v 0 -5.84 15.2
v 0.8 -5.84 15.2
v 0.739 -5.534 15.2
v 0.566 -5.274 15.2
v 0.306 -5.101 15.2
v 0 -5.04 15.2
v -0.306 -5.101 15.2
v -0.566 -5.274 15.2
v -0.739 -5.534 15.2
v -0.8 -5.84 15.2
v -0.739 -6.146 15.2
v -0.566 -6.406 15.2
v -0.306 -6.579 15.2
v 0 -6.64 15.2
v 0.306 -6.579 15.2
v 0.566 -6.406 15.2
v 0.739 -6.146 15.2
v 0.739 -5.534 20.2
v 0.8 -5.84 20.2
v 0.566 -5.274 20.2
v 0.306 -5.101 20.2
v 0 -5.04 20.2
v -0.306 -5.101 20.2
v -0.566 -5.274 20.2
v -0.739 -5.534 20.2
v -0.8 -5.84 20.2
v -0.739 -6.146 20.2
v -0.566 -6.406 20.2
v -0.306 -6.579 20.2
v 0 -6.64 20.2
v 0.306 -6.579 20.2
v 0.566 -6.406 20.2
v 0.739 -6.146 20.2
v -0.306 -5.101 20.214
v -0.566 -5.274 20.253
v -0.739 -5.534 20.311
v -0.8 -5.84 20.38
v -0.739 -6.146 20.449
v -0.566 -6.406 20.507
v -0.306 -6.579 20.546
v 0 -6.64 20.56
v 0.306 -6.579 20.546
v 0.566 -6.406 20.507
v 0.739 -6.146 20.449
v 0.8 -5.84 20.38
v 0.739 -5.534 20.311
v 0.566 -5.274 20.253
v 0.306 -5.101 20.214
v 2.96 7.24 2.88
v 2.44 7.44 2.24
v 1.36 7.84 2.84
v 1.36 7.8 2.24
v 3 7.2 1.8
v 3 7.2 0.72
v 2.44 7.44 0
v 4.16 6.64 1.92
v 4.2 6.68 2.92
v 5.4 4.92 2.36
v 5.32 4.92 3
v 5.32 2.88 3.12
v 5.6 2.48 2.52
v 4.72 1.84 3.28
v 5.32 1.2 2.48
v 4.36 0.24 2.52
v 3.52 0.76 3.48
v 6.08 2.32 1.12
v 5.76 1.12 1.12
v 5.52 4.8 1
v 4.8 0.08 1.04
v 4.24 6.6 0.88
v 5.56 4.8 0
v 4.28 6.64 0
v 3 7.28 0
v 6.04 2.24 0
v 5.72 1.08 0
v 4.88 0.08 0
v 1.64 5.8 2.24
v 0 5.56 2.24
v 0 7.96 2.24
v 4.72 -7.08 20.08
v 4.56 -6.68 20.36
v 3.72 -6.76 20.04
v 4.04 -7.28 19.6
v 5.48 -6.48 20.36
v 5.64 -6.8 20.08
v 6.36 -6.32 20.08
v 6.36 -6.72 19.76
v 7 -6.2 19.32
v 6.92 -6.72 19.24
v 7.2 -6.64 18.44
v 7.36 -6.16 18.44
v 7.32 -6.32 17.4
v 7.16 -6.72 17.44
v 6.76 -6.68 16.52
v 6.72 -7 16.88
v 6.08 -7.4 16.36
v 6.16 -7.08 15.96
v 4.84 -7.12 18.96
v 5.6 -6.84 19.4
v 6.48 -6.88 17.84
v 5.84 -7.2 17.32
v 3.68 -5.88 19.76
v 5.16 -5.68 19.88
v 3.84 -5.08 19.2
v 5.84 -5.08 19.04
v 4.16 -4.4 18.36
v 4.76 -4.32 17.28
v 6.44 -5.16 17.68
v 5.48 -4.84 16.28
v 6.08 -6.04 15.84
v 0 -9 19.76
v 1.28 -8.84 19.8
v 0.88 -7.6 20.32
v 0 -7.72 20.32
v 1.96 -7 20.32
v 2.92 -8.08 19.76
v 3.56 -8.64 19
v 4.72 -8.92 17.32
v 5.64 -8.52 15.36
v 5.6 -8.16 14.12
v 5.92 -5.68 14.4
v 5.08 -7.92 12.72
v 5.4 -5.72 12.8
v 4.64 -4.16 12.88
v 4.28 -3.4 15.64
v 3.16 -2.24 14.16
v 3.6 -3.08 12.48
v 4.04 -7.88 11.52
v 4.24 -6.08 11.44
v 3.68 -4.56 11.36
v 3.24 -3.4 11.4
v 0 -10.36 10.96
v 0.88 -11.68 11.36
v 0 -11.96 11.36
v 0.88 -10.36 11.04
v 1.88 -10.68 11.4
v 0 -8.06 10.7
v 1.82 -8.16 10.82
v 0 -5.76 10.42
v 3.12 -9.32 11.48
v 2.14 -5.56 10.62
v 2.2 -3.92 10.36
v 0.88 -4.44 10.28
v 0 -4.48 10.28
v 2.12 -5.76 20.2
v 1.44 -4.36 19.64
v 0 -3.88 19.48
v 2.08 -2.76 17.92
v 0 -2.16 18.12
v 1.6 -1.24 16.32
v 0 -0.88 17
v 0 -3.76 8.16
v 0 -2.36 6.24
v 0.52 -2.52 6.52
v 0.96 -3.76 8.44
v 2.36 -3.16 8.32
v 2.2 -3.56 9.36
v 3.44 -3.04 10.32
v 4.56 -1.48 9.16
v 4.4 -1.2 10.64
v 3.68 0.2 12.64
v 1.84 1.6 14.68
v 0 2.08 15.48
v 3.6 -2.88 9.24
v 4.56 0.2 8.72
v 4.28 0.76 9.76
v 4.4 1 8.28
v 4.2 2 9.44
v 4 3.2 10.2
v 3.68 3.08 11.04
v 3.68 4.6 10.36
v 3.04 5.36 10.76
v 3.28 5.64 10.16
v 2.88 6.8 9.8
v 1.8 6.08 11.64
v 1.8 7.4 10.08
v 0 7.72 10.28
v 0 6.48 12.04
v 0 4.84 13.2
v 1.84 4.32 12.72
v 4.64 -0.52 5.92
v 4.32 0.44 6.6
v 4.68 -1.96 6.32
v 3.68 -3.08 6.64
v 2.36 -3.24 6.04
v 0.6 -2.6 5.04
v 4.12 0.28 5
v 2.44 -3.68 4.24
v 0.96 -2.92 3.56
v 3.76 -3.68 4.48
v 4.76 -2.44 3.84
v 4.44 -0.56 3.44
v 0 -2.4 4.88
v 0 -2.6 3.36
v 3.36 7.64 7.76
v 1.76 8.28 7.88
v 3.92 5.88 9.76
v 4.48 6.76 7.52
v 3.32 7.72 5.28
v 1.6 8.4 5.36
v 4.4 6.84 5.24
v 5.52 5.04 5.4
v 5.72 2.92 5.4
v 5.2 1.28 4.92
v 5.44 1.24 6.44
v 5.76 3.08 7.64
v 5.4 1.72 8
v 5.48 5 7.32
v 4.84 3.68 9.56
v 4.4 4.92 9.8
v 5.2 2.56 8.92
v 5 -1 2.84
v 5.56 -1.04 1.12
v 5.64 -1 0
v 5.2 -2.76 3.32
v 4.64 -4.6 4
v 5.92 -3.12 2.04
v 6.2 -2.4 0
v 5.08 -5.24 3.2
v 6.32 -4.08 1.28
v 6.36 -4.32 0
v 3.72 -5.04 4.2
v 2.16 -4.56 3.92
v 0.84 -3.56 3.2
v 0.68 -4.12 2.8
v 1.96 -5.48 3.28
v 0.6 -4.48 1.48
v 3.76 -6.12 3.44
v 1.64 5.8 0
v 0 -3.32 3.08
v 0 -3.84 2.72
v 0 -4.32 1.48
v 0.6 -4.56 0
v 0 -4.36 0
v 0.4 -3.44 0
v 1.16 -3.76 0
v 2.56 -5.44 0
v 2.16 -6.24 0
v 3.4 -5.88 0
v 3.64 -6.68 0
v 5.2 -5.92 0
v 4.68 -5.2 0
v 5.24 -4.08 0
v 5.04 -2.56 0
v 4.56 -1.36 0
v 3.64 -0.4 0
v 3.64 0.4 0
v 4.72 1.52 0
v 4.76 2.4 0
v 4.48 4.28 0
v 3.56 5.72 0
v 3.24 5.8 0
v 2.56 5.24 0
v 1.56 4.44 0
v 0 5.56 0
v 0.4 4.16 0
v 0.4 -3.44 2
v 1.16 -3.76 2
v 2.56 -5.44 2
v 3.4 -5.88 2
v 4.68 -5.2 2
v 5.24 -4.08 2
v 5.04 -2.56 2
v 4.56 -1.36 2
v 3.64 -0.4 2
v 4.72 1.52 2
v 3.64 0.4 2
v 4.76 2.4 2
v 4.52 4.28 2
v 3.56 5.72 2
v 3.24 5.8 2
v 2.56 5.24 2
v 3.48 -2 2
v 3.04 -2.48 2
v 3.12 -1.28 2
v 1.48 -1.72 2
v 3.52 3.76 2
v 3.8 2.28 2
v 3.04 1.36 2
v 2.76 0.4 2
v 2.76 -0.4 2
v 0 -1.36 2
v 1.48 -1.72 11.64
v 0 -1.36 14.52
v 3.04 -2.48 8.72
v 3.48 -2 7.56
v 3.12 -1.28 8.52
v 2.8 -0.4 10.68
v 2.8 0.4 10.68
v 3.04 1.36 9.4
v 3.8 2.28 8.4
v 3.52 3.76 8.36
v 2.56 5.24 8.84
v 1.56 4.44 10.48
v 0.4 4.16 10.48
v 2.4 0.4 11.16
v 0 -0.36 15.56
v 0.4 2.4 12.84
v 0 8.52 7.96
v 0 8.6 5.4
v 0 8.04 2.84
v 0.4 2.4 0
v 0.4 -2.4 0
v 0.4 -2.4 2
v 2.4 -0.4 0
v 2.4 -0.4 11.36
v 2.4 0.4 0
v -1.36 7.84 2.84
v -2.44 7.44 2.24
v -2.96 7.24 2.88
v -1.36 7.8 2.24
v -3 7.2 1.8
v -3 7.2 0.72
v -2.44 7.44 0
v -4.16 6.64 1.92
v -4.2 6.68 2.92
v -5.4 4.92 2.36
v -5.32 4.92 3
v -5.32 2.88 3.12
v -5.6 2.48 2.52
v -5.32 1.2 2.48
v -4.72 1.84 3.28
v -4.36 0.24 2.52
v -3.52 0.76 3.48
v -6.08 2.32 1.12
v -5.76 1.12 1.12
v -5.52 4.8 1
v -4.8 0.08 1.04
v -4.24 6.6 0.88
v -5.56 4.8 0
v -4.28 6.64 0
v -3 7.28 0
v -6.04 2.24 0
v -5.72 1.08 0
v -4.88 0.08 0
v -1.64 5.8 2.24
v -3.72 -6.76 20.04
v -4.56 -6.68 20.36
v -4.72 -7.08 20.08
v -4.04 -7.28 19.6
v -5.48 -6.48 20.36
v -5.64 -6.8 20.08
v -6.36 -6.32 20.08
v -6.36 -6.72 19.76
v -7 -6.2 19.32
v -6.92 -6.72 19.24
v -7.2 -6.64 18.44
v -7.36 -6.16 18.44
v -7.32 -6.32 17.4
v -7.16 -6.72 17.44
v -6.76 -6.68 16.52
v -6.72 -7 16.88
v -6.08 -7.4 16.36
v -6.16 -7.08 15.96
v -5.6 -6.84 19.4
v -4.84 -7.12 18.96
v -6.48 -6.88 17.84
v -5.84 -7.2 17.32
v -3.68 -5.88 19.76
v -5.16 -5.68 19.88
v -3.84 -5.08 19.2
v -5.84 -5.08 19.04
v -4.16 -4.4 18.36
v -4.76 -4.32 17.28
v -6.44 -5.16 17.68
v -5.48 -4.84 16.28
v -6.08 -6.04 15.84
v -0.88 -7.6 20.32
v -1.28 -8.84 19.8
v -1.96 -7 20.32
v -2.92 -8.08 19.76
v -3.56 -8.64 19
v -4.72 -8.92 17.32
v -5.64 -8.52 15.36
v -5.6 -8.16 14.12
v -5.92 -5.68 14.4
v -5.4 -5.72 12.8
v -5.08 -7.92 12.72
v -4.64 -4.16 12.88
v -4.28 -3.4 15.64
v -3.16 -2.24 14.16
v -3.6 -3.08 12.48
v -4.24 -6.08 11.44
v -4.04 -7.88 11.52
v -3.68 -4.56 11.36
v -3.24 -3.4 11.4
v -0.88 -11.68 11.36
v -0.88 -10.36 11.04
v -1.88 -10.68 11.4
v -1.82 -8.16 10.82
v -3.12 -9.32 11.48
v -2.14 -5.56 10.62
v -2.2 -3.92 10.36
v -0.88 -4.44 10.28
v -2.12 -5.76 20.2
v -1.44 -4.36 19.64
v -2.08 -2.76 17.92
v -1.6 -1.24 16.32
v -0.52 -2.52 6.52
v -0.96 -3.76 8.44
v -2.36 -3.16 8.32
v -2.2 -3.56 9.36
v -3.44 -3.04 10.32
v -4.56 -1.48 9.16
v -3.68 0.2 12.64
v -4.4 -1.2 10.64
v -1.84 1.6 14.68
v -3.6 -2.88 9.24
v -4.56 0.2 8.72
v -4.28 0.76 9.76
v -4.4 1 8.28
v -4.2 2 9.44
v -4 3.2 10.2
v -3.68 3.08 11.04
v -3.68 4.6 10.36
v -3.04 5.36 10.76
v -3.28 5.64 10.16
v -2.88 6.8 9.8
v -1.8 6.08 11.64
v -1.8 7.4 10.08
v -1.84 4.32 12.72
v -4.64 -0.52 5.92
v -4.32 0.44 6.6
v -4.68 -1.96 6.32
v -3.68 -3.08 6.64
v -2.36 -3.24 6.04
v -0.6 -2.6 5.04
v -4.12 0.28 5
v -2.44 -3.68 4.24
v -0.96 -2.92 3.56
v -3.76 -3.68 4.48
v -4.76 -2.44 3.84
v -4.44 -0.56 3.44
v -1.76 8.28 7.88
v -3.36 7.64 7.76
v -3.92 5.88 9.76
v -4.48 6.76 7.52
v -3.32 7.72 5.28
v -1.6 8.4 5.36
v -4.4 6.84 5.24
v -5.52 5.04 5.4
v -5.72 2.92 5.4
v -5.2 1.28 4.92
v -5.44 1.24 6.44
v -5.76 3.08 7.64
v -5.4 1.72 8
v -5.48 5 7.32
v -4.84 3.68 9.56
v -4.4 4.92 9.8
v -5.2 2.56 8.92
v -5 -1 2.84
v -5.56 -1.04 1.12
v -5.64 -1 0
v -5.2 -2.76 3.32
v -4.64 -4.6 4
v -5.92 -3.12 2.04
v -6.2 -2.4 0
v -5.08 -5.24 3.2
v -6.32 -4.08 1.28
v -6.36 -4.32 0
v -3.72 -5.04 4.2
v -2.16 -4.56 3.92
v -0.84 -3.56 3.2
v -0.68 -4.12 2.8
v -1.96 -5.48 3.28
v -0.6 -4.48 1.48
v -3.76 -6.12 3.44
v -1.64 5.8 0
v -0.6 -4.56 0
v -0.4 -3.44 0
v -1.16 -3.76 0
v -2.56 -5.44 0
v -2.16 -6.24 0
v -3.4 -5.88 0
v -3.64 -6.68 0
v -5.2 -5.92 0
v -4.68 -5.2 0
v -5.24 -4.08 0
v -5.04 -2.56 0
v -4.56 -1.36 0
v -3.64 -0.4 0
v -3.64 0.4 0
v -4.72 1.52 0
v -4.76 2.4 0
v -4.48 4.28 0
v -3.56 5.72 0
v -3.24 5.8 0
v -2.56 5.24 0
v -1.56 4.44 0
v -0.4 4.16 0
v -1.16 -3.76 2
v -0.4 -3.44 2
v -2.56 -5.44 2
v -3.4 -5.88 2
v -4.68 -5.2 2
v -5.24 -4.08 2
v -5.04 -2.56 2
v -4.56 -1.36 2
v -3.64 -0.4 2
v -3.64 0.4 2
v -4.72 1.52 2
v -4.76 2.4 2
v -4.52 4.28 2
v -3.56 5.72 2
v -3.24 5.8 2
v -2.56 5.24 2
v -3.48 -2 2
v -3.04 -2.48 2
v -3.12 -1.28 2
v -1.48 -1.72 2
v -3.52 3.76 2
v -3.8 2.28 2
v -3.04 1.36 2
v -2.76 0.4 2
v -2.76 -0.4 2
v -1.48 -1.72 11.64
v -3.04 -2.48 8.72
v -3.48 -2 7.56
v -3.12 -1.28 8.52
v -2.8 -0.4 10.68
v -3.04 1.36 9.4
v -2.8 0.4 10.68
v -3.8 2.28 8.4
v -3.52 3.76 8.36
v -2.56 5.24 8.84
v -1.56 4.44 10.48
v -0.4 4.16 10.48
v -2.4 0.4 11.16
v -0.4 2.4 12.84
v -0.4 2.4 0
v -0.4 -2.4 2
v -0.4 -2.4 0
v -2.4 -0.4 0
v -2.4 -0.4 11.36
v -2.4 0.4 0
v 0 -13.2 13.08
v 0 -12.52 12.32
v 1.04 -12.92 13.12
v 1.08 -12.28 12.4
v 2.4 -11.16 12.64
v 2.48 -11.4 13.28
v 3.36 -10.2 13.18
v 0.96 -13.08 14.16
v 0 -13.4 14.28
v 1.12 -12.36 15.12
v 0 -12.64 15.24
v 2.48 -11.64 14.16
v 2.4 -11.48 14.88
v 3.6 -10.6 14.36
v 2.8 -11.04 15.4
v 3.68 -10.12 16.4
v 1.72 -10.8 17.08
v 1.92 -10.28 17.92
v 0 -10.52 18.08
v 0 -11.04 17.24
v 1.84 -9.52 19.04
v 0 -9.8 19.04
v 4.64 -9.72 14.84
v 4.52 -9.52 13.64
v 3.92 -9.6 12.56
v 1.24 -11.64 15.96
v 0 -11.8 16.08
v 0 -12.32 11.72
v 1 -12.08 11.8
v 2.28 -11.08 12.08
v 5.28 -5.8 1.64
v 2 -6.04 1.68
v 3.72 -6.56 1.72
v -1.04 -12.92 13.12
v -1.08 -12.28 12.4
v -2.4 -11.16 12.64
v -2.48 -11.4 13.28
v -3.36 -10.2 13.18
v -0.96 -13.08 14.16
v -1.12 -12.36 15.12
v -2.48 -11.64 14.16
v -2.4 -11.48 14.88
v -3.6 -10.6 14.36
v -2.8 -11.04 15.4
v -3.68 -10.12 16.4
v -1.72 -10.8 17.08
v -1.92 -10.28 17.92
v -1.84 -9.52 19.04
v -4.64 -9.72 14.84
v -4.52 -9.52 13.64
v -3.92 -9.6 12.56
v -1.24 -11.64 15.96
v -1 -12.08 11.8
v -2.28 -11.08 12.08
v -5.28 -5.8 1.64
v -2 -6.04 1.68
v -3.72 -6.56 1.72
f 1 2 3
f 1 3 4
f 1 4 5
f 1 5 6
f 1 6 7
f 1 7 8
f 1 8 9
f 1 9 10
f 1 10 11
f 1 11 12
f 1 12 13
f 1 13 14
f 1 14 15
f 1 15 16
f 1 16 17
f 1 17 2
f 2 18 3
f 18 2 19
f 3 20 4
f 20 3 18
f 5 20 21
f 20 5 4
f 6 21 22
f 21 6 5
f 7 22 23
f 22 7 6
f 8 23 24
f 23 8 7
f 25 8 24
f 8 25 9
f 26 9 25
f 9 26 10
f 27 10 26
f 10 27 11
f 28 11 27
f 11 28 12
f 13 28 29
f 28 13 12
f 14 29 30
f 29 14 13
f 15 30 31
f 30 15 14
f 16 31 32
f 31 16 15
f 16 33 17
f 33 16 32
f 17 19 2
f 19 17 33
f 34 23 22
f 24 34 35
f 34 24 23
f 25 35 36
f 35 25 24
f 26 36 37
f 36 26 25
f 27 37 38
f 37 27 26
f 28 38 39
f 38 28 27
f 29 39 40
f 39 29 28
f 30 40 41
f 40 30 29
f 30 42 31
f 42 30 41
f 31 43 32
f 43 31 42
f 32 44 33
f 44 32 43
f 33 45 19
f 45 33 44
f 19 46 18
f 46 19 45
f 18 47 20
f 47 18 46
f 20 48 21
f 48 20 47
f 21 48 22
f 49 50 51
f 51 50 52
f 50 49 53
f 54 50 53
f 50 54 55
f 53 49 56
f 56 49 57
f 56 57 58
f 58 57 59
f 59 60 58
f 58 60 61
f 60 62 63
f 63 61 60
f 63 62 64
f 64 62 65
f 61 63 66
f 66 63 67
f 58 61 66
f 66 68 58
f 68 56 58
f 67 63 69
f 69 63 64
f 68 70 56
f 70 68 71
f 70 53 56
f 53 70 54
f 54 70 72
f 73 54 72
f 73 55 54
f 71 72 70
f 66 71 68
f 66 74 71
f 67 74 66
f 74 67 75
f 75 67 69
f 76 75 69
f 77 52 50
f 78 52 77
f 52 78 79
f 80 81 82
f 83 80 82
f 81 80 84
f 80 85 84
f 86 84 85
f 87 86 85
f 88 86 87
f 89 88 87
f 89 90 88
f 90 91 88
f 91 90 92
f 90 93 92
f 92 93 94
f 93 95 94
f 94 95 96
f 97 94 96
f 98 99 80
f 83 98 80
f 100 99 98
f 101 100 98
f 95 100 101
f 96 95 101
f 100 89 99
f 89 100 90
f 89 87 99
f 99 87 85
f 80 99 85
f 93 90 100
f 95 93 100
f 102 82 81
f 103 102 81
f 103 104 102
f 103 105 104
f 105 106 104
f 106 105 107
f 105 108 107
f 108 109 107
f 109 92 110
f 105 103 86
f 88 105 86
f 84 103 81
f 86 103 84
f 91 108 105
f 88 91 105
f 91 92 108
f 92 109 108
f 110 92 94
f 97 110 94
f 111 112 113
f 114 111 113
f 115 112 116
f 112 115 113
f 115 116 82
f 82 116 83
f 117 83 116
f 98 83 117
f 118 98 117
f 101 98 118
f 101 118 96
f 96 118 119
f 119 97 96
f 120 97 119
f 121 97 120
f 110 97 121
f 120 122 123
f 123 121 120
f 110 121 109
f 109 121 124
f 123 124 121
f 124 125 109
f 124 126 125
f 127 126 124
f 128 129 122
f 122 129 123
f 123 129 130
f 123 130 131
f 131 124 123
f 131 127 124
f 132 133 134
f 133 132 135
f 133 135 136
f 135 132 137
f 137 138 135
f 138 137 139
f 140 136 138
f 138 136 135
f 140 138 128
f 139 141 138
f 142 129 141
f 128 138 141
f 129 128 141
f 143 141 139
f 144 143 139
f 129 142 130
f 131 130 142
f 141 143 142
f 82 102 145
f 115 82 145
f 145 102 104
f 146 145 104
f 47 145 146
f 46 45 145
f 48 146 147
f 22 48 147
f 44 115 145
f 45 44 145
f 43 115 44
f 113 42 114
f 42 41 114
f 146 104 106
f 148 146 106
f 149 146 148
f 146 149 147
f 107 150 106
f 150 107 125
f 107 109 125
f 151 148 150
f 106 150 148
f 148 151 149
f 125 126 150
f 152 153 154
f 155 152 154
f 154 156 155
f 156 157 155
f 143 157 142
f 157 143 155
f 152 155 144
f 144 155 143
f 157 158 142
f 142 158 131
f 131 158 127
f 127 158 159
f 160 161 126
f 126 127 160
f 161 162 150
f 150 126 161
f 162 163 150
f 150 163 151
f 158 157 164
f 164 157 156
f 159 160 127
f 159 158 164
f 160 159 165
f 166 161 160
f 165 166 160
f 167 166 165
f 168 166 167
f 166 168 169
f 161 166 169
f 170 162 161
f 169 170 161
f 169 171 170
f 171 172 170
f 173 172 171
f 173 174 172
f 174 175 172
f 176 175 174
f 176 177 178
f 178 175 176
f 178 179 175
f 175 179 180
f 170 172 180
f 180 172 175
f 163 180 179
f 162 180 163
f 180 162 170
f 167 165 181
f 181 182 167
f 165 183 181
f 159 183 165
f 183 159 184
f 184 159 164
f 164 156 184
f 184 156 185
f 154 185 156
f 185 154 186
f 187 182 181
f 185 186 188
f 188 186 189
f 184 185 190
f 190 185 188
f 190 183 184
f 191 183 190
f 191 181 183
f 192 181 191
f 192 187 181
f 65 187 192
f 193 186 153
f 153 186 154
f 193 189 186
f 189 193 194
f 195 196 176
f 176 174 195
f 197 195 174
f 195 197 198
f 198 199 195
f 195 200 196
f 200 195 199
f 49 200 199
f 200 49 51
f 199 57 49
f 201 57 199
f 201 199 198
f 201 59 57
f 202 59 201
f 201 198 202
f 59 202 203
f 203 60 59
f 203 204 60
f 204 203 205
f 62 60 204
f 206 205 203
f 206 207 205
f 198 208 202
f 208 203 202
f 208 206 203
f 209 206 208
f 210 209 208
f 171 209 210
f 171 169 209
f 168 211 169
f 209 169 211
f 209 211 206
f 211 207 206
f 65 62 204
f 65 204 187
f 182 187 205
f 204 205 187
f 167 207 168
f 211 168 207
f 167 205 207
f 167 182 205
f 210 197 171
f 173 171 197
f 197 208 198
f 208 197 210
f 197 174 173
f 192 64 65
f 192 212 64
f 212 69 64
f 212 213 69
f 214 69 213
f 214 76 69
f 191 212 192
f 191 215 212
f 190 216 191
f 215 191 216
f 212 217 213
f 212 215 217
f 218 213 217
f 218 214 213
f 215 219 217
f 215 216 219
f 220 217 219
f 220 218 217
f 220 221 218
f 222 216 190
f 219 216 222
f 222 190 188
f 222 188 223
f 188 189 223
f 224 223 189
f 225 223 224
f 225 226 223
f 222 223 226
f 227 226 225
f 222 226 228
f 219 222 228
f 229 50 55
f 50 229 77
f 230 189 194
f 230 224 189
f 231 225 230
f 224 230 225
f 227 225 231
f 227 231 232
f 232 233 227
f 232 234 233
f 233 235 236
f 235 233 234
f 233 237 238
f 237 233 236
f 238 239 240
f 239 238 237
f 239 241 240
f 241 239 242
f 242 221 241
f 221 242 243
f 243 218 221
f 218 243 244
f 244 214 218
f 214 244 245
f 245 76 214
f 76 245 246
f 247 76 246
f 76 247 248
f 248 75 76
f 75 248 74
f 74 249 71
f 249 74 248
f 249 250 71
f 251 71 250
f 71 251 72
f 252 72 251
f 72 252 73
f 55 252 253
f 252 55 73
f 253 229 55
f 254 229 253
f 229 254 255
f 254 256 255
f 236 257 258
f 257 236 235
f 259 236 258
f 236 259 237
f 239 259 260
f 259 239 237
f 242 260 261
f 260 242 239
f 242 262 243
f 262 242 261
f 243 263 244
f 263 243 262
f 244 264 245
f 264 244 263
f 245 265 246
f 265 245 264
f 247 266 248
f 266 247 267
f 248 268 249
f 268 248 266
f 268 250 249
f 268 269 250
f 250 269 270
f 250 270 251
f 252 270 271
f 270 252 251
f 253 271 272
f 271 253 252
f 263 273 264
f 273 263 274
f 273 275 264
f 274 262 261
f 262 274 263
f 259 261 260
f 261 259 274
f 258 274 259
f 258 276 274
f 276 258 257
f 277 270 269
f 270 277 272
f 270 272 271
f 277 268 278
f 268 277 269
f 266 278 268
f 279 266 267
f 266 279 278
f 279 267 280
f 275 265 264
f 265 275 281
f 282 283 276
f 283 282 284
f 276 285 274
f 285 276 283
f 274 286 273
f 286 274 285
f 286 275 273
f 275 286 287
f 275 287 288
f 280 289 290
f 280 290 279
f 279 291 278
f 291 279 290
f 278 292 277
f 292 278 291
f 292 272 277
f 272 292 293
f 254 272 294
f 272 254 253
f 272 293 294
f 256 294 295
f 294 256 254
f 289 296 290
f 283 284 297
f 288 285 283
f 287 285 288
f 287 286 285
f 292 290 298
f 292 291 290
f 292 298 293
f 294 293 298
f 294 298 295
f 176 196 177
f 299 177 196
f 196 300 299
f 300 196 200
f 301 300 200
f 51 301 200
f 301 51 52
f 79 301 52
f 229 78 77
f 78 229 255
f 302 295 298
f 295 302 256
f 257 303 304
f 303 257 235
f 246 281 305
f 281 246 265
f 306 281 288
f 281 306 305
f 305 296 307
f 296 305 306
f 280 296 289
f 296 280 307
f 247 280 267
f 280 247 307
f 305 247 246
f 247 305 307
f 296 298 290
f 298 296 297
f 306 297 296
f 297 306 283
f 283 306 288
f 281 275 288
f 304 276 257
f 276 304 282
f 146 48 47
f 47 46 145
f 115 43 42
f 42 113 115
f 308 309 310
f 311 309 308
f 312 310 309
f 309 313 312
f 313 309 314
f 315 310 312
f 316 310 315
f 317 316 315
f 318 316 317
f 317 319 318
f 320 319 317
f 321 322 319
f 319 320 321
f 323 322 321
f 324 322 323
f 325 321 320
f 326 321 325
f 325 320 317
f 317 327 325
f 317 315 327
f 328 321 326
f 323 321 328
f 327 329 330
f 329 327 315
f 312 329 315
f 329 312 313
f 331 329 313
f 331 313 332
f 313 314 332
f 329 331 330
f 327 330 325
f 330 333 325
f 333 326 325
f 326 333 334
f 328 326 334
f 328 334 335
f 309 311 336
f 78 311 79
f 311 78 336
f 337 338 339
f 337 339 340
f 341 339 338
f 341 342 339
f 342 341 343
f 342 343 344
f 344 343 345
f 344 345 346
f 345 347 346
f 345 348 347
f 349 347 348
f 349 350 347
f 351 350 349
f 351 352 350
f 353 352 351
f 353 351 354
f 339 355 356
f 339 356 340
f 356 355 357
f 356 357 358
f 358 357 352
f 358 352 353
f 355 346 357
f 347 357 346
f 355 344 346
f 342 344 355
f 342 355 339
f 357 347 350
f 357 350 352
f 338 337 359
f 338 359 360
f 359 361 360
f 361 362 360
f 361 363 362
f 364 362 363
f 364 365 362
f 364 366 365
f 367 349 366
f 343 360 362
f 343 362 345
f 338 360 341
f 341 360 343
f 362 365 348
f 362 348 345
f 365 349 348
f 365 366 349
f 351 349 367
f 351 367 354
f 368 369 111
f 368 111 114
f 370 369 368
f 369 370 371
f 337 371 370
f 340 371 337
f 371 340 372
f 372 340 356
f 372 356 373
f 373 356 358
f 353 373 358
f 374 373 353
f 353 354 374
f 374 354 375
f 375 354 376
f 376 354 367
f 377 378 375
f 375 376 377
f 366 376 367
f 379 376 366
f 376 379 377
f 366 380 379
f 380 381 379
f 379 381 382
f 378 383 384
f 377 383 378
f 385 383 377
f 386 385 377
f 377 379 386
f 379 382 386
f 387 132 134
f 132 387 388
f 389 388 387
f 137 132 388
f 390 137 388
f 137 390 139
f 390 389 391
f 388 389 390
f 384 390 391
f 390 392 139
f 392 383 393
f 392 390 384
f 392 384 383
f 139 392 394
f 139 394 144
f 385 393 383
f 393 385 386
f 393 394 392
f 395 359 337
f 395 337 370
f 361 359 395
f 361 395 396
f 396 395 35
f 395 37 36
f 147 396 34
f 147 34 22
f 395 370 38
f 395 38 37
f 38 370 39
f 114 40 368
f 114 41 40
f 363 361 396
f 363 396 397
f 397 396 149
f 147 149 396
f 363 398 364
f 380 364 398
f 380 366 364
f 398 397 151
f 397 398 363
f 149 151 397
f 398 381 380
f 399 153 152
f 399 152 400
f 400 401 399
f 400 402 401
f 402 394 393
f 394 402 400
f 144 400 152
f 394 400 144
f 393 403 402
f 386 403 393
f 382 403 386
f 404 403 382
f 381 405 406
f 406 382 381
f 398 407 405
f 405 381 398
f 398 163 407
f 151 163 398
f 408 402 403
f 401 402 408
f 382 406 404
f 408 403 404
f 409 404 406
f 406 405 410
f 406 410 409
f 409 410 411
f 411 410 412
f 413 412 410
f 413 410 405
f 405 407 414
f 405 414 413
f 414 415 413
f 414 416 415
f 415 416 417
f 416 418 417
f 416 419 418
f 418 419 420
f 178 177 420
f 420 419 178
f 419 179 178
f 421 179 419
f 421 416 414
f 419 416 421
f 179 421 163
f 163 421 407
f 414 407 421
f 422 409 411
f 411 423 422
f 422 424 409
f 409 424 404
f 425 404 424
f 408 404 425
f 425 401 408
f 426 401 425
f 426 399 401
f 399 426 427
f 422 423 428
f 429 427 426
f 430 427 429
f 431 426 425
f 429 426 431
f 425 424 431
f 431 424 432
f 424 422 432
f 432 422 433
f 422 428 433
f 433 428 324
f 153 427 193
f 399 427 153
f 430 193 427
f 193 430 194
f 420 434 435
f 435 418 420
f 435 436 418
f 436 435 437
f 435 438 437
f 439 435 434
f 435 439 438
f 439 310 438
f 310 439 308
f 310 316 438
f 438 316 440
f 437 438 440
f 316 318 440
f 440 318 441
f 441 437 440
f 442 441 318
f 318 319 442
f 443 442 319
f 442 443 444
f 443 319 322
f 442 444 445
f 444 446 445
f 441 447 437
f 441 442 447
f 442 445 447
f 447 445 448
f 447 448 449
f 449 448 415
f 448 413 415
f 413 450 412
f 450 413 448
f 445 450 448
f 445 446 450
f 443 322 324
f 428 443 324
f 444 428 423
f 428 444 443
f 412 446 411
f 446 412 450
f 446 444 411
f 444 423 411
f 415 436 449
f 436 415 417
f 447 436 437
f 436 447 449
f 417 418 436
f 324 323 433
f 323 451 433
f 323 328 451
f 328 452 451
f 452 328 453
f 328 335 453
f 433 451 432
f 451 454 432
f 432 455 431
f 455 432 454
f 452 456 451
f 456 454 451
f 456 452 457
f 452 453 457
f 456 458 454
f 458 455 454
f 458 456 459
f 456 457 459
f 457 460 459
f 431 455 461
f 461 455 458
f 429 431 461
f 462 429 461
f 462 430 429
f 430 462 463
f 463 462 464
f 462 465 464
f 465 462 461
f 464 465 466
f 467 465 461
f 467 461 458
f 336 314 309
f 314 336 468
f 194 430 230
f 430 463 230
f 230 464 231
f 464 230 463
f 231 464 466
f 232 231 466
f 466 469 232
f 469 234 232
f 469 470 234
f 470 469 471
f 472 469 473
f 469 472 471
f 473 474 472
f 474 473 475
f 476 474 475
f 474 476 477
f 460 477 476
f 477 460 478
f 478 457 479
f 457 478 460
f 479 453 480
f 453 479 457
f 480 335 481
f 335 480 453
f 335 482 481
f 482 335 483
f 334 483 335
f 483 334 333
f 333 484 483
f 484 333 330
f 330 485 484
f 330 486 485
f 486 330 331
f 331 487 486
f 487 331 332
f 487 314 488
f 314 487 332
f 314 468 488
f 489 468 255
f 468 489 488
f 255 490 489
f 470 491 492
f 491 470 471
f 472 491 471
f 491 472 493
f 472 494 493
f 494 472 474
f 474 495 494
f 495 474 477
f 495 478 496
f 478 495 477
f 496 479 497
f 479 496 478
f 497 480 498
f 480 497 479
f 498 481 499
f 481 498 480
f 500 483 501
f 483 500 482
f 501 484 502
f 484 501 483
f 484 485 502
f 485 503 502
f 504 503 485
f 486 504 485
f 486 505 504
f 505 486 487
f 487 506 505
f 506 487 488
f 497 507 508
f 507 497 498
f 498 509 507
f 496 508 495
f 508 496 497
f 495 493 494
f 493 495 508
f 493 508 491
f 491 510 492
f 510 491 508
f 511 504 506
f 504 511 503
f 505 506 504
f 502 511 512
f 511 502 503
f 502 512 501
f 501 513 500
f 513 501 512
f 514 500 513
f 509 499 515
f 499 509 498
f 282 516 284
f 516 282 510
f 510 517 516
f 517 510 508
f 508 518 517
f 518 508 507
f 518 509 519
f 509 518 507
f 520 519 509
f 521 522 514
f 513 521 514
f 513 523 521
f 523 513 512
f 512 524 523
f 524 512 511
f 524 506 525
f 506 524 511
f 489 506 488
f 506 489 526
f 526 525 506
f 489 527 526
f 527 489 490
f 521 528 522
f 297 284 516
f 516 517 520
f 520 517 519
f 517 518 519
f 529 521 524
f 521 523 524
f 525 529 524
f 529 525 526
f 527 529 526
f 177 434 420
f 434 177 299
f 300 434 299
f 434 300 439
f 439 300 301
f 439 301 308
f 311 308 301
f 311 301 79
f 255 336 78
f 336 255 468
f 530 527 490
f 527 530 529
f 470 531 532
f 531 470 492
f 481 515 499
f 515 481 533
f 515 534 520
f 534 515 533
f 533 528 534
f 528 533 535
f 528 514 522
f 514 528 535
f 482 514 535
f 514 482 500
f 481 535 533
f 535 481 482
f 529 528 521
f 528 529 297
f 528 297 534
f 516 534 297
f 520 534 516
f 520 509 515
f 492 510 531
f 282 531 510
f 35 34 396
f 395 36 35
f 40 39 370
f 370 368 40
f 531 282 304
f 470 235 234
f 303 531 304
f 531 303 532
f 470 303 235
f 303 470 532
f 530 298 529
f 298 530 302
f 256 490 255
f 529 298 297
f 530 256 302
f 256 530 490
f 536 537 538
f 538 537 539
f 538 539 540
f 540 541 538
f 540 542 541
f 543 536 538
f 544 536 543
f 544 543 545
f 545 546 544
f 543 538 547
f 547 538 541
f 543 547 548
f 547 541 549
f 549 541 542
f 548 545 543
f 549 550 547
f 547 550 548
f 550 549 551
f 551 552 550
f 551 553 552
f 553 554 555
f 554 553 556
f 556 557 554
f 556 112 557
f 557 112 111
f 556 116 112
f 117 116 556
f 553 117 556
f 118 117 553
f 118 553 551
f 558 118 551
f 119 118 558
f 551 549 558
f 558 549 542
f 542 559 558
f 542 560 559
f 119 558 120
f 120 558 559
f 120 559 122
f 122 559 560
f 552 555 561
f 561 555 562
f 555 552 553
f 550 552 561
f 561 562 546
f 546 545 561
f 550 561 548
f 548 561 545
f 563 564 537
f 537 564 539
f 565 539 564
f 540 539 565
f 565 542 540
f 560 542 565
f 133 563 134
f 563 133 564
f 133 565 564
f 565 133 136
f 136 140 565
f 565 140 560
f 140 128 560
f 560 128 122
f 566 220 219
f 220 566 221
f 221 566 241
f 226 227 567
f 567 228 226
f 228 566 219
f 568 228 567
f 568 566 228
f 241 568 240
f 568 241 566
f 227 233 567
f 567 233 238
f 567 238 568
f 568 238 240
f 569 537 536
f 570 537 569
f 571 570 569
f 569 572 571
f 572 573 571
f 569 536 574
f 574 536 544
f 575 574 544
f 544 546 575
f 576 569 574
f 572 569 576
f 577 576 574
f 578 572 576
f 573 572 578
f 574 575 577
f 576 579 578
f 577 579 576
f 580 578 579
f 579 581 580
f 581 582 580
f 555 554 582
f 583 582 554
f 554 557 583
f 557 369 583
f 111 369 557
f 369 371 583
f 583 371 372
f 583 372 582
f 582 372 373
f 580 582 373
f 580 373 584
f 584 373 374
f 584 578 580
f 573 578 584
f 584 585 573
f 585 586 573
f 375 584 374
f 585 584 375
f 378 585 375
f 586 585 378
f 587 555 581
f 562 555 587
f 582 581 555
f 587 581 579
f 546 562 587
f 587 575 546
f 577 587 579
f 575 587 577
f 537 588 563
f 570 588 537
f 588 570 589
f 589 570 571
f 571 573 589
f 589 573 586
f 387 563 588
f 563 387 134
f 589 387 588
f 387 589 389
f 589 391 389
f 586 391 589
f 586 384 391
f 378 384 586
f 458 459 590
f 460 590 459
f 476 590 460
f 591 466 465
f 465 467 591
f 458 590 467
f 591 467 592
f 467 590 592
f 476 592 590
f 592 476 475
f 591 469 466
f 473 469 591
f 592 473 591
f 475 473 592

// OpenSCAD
use <../lib.scad>
use <s/14732s00.scad>
use <s/14732s02.scad>
use <s/14732s03.scad>
function ldraw_lib__14732() = [
// 0 Animal Bear Baby Cub Sitting
// 0 Name: 14732.dat
// 0 Author: Philippe Hurbain [Philo]
// 0 !LDRAW_ORG Part UPDATE 2025-11
// 0 !LICENSE Licensed under CC BY 4.0 : see CAreadme.txt
// 
// 0 BFC CERTIFY CCW
  [0,"BFC","CERTIFY"],
  [0,"BFC","CCW"],
// 
// 0 !KEYWORDS Brickowl 357061, Friends
// 
// 0 !HISTORY 2025-09-27 {LEGO Instructions App} Original part shape
// 0 !HISTORY 2025-09-27 [Philo] File preparation for LDraw Parts Tracker
// 0 !HISTORY 2025-11-30 [OrionP] Official Update 2025-11
// 
// 1 16 0 0 0 1 0 0 0 1 0 0 0 1 s\14732s00.dat
  [1,16,0,0,0,1,0,0,0,1,0,0,0,1, ldraw_lib__s__14732s00()],
// 1 16 0 0 0 1 0 0 0 1 0 0 0 1 s\14732s02.dat
  [1,16,0,0,0,1,0,0,0,1,0,0,0,1, ldraw_lib__s__14732s02()],
// 1 16 0 0 0 1 0 0 0 1 0 0 0 1 s\14732s03.dat
  [1,16,0,0,0,1,0,0,0,1,0,0,0,1, ldraw_lib__s__14732s03()],
// 1 16 0 0 0 -1 0 0 0 1 0 0 0 1 s\14732s02.dat
  [1,16,0,0,0,-1,0,0,0,1,0,0,0,1, ldraw_lib__s__14732s02()],
// 1 16 0 0 0 -1 0 0 0 1 0 0 0 1 s\14732s03.dat
  [1,16,0,0,0,-1,0,0,0,1,0,0,0,1, ldraw_lib__s__14732s03()],
];
module ldraw_lib__14732(step=0, col=false, unit=2/5, alt=false, line=0.2, solid=!$preview)
    makepoly(ldraw_lib__14732(), step=step, col=col, unit=unit, alt=alt, line=line, solid=solid);
ldraw_lib__14732(line=0.2);
